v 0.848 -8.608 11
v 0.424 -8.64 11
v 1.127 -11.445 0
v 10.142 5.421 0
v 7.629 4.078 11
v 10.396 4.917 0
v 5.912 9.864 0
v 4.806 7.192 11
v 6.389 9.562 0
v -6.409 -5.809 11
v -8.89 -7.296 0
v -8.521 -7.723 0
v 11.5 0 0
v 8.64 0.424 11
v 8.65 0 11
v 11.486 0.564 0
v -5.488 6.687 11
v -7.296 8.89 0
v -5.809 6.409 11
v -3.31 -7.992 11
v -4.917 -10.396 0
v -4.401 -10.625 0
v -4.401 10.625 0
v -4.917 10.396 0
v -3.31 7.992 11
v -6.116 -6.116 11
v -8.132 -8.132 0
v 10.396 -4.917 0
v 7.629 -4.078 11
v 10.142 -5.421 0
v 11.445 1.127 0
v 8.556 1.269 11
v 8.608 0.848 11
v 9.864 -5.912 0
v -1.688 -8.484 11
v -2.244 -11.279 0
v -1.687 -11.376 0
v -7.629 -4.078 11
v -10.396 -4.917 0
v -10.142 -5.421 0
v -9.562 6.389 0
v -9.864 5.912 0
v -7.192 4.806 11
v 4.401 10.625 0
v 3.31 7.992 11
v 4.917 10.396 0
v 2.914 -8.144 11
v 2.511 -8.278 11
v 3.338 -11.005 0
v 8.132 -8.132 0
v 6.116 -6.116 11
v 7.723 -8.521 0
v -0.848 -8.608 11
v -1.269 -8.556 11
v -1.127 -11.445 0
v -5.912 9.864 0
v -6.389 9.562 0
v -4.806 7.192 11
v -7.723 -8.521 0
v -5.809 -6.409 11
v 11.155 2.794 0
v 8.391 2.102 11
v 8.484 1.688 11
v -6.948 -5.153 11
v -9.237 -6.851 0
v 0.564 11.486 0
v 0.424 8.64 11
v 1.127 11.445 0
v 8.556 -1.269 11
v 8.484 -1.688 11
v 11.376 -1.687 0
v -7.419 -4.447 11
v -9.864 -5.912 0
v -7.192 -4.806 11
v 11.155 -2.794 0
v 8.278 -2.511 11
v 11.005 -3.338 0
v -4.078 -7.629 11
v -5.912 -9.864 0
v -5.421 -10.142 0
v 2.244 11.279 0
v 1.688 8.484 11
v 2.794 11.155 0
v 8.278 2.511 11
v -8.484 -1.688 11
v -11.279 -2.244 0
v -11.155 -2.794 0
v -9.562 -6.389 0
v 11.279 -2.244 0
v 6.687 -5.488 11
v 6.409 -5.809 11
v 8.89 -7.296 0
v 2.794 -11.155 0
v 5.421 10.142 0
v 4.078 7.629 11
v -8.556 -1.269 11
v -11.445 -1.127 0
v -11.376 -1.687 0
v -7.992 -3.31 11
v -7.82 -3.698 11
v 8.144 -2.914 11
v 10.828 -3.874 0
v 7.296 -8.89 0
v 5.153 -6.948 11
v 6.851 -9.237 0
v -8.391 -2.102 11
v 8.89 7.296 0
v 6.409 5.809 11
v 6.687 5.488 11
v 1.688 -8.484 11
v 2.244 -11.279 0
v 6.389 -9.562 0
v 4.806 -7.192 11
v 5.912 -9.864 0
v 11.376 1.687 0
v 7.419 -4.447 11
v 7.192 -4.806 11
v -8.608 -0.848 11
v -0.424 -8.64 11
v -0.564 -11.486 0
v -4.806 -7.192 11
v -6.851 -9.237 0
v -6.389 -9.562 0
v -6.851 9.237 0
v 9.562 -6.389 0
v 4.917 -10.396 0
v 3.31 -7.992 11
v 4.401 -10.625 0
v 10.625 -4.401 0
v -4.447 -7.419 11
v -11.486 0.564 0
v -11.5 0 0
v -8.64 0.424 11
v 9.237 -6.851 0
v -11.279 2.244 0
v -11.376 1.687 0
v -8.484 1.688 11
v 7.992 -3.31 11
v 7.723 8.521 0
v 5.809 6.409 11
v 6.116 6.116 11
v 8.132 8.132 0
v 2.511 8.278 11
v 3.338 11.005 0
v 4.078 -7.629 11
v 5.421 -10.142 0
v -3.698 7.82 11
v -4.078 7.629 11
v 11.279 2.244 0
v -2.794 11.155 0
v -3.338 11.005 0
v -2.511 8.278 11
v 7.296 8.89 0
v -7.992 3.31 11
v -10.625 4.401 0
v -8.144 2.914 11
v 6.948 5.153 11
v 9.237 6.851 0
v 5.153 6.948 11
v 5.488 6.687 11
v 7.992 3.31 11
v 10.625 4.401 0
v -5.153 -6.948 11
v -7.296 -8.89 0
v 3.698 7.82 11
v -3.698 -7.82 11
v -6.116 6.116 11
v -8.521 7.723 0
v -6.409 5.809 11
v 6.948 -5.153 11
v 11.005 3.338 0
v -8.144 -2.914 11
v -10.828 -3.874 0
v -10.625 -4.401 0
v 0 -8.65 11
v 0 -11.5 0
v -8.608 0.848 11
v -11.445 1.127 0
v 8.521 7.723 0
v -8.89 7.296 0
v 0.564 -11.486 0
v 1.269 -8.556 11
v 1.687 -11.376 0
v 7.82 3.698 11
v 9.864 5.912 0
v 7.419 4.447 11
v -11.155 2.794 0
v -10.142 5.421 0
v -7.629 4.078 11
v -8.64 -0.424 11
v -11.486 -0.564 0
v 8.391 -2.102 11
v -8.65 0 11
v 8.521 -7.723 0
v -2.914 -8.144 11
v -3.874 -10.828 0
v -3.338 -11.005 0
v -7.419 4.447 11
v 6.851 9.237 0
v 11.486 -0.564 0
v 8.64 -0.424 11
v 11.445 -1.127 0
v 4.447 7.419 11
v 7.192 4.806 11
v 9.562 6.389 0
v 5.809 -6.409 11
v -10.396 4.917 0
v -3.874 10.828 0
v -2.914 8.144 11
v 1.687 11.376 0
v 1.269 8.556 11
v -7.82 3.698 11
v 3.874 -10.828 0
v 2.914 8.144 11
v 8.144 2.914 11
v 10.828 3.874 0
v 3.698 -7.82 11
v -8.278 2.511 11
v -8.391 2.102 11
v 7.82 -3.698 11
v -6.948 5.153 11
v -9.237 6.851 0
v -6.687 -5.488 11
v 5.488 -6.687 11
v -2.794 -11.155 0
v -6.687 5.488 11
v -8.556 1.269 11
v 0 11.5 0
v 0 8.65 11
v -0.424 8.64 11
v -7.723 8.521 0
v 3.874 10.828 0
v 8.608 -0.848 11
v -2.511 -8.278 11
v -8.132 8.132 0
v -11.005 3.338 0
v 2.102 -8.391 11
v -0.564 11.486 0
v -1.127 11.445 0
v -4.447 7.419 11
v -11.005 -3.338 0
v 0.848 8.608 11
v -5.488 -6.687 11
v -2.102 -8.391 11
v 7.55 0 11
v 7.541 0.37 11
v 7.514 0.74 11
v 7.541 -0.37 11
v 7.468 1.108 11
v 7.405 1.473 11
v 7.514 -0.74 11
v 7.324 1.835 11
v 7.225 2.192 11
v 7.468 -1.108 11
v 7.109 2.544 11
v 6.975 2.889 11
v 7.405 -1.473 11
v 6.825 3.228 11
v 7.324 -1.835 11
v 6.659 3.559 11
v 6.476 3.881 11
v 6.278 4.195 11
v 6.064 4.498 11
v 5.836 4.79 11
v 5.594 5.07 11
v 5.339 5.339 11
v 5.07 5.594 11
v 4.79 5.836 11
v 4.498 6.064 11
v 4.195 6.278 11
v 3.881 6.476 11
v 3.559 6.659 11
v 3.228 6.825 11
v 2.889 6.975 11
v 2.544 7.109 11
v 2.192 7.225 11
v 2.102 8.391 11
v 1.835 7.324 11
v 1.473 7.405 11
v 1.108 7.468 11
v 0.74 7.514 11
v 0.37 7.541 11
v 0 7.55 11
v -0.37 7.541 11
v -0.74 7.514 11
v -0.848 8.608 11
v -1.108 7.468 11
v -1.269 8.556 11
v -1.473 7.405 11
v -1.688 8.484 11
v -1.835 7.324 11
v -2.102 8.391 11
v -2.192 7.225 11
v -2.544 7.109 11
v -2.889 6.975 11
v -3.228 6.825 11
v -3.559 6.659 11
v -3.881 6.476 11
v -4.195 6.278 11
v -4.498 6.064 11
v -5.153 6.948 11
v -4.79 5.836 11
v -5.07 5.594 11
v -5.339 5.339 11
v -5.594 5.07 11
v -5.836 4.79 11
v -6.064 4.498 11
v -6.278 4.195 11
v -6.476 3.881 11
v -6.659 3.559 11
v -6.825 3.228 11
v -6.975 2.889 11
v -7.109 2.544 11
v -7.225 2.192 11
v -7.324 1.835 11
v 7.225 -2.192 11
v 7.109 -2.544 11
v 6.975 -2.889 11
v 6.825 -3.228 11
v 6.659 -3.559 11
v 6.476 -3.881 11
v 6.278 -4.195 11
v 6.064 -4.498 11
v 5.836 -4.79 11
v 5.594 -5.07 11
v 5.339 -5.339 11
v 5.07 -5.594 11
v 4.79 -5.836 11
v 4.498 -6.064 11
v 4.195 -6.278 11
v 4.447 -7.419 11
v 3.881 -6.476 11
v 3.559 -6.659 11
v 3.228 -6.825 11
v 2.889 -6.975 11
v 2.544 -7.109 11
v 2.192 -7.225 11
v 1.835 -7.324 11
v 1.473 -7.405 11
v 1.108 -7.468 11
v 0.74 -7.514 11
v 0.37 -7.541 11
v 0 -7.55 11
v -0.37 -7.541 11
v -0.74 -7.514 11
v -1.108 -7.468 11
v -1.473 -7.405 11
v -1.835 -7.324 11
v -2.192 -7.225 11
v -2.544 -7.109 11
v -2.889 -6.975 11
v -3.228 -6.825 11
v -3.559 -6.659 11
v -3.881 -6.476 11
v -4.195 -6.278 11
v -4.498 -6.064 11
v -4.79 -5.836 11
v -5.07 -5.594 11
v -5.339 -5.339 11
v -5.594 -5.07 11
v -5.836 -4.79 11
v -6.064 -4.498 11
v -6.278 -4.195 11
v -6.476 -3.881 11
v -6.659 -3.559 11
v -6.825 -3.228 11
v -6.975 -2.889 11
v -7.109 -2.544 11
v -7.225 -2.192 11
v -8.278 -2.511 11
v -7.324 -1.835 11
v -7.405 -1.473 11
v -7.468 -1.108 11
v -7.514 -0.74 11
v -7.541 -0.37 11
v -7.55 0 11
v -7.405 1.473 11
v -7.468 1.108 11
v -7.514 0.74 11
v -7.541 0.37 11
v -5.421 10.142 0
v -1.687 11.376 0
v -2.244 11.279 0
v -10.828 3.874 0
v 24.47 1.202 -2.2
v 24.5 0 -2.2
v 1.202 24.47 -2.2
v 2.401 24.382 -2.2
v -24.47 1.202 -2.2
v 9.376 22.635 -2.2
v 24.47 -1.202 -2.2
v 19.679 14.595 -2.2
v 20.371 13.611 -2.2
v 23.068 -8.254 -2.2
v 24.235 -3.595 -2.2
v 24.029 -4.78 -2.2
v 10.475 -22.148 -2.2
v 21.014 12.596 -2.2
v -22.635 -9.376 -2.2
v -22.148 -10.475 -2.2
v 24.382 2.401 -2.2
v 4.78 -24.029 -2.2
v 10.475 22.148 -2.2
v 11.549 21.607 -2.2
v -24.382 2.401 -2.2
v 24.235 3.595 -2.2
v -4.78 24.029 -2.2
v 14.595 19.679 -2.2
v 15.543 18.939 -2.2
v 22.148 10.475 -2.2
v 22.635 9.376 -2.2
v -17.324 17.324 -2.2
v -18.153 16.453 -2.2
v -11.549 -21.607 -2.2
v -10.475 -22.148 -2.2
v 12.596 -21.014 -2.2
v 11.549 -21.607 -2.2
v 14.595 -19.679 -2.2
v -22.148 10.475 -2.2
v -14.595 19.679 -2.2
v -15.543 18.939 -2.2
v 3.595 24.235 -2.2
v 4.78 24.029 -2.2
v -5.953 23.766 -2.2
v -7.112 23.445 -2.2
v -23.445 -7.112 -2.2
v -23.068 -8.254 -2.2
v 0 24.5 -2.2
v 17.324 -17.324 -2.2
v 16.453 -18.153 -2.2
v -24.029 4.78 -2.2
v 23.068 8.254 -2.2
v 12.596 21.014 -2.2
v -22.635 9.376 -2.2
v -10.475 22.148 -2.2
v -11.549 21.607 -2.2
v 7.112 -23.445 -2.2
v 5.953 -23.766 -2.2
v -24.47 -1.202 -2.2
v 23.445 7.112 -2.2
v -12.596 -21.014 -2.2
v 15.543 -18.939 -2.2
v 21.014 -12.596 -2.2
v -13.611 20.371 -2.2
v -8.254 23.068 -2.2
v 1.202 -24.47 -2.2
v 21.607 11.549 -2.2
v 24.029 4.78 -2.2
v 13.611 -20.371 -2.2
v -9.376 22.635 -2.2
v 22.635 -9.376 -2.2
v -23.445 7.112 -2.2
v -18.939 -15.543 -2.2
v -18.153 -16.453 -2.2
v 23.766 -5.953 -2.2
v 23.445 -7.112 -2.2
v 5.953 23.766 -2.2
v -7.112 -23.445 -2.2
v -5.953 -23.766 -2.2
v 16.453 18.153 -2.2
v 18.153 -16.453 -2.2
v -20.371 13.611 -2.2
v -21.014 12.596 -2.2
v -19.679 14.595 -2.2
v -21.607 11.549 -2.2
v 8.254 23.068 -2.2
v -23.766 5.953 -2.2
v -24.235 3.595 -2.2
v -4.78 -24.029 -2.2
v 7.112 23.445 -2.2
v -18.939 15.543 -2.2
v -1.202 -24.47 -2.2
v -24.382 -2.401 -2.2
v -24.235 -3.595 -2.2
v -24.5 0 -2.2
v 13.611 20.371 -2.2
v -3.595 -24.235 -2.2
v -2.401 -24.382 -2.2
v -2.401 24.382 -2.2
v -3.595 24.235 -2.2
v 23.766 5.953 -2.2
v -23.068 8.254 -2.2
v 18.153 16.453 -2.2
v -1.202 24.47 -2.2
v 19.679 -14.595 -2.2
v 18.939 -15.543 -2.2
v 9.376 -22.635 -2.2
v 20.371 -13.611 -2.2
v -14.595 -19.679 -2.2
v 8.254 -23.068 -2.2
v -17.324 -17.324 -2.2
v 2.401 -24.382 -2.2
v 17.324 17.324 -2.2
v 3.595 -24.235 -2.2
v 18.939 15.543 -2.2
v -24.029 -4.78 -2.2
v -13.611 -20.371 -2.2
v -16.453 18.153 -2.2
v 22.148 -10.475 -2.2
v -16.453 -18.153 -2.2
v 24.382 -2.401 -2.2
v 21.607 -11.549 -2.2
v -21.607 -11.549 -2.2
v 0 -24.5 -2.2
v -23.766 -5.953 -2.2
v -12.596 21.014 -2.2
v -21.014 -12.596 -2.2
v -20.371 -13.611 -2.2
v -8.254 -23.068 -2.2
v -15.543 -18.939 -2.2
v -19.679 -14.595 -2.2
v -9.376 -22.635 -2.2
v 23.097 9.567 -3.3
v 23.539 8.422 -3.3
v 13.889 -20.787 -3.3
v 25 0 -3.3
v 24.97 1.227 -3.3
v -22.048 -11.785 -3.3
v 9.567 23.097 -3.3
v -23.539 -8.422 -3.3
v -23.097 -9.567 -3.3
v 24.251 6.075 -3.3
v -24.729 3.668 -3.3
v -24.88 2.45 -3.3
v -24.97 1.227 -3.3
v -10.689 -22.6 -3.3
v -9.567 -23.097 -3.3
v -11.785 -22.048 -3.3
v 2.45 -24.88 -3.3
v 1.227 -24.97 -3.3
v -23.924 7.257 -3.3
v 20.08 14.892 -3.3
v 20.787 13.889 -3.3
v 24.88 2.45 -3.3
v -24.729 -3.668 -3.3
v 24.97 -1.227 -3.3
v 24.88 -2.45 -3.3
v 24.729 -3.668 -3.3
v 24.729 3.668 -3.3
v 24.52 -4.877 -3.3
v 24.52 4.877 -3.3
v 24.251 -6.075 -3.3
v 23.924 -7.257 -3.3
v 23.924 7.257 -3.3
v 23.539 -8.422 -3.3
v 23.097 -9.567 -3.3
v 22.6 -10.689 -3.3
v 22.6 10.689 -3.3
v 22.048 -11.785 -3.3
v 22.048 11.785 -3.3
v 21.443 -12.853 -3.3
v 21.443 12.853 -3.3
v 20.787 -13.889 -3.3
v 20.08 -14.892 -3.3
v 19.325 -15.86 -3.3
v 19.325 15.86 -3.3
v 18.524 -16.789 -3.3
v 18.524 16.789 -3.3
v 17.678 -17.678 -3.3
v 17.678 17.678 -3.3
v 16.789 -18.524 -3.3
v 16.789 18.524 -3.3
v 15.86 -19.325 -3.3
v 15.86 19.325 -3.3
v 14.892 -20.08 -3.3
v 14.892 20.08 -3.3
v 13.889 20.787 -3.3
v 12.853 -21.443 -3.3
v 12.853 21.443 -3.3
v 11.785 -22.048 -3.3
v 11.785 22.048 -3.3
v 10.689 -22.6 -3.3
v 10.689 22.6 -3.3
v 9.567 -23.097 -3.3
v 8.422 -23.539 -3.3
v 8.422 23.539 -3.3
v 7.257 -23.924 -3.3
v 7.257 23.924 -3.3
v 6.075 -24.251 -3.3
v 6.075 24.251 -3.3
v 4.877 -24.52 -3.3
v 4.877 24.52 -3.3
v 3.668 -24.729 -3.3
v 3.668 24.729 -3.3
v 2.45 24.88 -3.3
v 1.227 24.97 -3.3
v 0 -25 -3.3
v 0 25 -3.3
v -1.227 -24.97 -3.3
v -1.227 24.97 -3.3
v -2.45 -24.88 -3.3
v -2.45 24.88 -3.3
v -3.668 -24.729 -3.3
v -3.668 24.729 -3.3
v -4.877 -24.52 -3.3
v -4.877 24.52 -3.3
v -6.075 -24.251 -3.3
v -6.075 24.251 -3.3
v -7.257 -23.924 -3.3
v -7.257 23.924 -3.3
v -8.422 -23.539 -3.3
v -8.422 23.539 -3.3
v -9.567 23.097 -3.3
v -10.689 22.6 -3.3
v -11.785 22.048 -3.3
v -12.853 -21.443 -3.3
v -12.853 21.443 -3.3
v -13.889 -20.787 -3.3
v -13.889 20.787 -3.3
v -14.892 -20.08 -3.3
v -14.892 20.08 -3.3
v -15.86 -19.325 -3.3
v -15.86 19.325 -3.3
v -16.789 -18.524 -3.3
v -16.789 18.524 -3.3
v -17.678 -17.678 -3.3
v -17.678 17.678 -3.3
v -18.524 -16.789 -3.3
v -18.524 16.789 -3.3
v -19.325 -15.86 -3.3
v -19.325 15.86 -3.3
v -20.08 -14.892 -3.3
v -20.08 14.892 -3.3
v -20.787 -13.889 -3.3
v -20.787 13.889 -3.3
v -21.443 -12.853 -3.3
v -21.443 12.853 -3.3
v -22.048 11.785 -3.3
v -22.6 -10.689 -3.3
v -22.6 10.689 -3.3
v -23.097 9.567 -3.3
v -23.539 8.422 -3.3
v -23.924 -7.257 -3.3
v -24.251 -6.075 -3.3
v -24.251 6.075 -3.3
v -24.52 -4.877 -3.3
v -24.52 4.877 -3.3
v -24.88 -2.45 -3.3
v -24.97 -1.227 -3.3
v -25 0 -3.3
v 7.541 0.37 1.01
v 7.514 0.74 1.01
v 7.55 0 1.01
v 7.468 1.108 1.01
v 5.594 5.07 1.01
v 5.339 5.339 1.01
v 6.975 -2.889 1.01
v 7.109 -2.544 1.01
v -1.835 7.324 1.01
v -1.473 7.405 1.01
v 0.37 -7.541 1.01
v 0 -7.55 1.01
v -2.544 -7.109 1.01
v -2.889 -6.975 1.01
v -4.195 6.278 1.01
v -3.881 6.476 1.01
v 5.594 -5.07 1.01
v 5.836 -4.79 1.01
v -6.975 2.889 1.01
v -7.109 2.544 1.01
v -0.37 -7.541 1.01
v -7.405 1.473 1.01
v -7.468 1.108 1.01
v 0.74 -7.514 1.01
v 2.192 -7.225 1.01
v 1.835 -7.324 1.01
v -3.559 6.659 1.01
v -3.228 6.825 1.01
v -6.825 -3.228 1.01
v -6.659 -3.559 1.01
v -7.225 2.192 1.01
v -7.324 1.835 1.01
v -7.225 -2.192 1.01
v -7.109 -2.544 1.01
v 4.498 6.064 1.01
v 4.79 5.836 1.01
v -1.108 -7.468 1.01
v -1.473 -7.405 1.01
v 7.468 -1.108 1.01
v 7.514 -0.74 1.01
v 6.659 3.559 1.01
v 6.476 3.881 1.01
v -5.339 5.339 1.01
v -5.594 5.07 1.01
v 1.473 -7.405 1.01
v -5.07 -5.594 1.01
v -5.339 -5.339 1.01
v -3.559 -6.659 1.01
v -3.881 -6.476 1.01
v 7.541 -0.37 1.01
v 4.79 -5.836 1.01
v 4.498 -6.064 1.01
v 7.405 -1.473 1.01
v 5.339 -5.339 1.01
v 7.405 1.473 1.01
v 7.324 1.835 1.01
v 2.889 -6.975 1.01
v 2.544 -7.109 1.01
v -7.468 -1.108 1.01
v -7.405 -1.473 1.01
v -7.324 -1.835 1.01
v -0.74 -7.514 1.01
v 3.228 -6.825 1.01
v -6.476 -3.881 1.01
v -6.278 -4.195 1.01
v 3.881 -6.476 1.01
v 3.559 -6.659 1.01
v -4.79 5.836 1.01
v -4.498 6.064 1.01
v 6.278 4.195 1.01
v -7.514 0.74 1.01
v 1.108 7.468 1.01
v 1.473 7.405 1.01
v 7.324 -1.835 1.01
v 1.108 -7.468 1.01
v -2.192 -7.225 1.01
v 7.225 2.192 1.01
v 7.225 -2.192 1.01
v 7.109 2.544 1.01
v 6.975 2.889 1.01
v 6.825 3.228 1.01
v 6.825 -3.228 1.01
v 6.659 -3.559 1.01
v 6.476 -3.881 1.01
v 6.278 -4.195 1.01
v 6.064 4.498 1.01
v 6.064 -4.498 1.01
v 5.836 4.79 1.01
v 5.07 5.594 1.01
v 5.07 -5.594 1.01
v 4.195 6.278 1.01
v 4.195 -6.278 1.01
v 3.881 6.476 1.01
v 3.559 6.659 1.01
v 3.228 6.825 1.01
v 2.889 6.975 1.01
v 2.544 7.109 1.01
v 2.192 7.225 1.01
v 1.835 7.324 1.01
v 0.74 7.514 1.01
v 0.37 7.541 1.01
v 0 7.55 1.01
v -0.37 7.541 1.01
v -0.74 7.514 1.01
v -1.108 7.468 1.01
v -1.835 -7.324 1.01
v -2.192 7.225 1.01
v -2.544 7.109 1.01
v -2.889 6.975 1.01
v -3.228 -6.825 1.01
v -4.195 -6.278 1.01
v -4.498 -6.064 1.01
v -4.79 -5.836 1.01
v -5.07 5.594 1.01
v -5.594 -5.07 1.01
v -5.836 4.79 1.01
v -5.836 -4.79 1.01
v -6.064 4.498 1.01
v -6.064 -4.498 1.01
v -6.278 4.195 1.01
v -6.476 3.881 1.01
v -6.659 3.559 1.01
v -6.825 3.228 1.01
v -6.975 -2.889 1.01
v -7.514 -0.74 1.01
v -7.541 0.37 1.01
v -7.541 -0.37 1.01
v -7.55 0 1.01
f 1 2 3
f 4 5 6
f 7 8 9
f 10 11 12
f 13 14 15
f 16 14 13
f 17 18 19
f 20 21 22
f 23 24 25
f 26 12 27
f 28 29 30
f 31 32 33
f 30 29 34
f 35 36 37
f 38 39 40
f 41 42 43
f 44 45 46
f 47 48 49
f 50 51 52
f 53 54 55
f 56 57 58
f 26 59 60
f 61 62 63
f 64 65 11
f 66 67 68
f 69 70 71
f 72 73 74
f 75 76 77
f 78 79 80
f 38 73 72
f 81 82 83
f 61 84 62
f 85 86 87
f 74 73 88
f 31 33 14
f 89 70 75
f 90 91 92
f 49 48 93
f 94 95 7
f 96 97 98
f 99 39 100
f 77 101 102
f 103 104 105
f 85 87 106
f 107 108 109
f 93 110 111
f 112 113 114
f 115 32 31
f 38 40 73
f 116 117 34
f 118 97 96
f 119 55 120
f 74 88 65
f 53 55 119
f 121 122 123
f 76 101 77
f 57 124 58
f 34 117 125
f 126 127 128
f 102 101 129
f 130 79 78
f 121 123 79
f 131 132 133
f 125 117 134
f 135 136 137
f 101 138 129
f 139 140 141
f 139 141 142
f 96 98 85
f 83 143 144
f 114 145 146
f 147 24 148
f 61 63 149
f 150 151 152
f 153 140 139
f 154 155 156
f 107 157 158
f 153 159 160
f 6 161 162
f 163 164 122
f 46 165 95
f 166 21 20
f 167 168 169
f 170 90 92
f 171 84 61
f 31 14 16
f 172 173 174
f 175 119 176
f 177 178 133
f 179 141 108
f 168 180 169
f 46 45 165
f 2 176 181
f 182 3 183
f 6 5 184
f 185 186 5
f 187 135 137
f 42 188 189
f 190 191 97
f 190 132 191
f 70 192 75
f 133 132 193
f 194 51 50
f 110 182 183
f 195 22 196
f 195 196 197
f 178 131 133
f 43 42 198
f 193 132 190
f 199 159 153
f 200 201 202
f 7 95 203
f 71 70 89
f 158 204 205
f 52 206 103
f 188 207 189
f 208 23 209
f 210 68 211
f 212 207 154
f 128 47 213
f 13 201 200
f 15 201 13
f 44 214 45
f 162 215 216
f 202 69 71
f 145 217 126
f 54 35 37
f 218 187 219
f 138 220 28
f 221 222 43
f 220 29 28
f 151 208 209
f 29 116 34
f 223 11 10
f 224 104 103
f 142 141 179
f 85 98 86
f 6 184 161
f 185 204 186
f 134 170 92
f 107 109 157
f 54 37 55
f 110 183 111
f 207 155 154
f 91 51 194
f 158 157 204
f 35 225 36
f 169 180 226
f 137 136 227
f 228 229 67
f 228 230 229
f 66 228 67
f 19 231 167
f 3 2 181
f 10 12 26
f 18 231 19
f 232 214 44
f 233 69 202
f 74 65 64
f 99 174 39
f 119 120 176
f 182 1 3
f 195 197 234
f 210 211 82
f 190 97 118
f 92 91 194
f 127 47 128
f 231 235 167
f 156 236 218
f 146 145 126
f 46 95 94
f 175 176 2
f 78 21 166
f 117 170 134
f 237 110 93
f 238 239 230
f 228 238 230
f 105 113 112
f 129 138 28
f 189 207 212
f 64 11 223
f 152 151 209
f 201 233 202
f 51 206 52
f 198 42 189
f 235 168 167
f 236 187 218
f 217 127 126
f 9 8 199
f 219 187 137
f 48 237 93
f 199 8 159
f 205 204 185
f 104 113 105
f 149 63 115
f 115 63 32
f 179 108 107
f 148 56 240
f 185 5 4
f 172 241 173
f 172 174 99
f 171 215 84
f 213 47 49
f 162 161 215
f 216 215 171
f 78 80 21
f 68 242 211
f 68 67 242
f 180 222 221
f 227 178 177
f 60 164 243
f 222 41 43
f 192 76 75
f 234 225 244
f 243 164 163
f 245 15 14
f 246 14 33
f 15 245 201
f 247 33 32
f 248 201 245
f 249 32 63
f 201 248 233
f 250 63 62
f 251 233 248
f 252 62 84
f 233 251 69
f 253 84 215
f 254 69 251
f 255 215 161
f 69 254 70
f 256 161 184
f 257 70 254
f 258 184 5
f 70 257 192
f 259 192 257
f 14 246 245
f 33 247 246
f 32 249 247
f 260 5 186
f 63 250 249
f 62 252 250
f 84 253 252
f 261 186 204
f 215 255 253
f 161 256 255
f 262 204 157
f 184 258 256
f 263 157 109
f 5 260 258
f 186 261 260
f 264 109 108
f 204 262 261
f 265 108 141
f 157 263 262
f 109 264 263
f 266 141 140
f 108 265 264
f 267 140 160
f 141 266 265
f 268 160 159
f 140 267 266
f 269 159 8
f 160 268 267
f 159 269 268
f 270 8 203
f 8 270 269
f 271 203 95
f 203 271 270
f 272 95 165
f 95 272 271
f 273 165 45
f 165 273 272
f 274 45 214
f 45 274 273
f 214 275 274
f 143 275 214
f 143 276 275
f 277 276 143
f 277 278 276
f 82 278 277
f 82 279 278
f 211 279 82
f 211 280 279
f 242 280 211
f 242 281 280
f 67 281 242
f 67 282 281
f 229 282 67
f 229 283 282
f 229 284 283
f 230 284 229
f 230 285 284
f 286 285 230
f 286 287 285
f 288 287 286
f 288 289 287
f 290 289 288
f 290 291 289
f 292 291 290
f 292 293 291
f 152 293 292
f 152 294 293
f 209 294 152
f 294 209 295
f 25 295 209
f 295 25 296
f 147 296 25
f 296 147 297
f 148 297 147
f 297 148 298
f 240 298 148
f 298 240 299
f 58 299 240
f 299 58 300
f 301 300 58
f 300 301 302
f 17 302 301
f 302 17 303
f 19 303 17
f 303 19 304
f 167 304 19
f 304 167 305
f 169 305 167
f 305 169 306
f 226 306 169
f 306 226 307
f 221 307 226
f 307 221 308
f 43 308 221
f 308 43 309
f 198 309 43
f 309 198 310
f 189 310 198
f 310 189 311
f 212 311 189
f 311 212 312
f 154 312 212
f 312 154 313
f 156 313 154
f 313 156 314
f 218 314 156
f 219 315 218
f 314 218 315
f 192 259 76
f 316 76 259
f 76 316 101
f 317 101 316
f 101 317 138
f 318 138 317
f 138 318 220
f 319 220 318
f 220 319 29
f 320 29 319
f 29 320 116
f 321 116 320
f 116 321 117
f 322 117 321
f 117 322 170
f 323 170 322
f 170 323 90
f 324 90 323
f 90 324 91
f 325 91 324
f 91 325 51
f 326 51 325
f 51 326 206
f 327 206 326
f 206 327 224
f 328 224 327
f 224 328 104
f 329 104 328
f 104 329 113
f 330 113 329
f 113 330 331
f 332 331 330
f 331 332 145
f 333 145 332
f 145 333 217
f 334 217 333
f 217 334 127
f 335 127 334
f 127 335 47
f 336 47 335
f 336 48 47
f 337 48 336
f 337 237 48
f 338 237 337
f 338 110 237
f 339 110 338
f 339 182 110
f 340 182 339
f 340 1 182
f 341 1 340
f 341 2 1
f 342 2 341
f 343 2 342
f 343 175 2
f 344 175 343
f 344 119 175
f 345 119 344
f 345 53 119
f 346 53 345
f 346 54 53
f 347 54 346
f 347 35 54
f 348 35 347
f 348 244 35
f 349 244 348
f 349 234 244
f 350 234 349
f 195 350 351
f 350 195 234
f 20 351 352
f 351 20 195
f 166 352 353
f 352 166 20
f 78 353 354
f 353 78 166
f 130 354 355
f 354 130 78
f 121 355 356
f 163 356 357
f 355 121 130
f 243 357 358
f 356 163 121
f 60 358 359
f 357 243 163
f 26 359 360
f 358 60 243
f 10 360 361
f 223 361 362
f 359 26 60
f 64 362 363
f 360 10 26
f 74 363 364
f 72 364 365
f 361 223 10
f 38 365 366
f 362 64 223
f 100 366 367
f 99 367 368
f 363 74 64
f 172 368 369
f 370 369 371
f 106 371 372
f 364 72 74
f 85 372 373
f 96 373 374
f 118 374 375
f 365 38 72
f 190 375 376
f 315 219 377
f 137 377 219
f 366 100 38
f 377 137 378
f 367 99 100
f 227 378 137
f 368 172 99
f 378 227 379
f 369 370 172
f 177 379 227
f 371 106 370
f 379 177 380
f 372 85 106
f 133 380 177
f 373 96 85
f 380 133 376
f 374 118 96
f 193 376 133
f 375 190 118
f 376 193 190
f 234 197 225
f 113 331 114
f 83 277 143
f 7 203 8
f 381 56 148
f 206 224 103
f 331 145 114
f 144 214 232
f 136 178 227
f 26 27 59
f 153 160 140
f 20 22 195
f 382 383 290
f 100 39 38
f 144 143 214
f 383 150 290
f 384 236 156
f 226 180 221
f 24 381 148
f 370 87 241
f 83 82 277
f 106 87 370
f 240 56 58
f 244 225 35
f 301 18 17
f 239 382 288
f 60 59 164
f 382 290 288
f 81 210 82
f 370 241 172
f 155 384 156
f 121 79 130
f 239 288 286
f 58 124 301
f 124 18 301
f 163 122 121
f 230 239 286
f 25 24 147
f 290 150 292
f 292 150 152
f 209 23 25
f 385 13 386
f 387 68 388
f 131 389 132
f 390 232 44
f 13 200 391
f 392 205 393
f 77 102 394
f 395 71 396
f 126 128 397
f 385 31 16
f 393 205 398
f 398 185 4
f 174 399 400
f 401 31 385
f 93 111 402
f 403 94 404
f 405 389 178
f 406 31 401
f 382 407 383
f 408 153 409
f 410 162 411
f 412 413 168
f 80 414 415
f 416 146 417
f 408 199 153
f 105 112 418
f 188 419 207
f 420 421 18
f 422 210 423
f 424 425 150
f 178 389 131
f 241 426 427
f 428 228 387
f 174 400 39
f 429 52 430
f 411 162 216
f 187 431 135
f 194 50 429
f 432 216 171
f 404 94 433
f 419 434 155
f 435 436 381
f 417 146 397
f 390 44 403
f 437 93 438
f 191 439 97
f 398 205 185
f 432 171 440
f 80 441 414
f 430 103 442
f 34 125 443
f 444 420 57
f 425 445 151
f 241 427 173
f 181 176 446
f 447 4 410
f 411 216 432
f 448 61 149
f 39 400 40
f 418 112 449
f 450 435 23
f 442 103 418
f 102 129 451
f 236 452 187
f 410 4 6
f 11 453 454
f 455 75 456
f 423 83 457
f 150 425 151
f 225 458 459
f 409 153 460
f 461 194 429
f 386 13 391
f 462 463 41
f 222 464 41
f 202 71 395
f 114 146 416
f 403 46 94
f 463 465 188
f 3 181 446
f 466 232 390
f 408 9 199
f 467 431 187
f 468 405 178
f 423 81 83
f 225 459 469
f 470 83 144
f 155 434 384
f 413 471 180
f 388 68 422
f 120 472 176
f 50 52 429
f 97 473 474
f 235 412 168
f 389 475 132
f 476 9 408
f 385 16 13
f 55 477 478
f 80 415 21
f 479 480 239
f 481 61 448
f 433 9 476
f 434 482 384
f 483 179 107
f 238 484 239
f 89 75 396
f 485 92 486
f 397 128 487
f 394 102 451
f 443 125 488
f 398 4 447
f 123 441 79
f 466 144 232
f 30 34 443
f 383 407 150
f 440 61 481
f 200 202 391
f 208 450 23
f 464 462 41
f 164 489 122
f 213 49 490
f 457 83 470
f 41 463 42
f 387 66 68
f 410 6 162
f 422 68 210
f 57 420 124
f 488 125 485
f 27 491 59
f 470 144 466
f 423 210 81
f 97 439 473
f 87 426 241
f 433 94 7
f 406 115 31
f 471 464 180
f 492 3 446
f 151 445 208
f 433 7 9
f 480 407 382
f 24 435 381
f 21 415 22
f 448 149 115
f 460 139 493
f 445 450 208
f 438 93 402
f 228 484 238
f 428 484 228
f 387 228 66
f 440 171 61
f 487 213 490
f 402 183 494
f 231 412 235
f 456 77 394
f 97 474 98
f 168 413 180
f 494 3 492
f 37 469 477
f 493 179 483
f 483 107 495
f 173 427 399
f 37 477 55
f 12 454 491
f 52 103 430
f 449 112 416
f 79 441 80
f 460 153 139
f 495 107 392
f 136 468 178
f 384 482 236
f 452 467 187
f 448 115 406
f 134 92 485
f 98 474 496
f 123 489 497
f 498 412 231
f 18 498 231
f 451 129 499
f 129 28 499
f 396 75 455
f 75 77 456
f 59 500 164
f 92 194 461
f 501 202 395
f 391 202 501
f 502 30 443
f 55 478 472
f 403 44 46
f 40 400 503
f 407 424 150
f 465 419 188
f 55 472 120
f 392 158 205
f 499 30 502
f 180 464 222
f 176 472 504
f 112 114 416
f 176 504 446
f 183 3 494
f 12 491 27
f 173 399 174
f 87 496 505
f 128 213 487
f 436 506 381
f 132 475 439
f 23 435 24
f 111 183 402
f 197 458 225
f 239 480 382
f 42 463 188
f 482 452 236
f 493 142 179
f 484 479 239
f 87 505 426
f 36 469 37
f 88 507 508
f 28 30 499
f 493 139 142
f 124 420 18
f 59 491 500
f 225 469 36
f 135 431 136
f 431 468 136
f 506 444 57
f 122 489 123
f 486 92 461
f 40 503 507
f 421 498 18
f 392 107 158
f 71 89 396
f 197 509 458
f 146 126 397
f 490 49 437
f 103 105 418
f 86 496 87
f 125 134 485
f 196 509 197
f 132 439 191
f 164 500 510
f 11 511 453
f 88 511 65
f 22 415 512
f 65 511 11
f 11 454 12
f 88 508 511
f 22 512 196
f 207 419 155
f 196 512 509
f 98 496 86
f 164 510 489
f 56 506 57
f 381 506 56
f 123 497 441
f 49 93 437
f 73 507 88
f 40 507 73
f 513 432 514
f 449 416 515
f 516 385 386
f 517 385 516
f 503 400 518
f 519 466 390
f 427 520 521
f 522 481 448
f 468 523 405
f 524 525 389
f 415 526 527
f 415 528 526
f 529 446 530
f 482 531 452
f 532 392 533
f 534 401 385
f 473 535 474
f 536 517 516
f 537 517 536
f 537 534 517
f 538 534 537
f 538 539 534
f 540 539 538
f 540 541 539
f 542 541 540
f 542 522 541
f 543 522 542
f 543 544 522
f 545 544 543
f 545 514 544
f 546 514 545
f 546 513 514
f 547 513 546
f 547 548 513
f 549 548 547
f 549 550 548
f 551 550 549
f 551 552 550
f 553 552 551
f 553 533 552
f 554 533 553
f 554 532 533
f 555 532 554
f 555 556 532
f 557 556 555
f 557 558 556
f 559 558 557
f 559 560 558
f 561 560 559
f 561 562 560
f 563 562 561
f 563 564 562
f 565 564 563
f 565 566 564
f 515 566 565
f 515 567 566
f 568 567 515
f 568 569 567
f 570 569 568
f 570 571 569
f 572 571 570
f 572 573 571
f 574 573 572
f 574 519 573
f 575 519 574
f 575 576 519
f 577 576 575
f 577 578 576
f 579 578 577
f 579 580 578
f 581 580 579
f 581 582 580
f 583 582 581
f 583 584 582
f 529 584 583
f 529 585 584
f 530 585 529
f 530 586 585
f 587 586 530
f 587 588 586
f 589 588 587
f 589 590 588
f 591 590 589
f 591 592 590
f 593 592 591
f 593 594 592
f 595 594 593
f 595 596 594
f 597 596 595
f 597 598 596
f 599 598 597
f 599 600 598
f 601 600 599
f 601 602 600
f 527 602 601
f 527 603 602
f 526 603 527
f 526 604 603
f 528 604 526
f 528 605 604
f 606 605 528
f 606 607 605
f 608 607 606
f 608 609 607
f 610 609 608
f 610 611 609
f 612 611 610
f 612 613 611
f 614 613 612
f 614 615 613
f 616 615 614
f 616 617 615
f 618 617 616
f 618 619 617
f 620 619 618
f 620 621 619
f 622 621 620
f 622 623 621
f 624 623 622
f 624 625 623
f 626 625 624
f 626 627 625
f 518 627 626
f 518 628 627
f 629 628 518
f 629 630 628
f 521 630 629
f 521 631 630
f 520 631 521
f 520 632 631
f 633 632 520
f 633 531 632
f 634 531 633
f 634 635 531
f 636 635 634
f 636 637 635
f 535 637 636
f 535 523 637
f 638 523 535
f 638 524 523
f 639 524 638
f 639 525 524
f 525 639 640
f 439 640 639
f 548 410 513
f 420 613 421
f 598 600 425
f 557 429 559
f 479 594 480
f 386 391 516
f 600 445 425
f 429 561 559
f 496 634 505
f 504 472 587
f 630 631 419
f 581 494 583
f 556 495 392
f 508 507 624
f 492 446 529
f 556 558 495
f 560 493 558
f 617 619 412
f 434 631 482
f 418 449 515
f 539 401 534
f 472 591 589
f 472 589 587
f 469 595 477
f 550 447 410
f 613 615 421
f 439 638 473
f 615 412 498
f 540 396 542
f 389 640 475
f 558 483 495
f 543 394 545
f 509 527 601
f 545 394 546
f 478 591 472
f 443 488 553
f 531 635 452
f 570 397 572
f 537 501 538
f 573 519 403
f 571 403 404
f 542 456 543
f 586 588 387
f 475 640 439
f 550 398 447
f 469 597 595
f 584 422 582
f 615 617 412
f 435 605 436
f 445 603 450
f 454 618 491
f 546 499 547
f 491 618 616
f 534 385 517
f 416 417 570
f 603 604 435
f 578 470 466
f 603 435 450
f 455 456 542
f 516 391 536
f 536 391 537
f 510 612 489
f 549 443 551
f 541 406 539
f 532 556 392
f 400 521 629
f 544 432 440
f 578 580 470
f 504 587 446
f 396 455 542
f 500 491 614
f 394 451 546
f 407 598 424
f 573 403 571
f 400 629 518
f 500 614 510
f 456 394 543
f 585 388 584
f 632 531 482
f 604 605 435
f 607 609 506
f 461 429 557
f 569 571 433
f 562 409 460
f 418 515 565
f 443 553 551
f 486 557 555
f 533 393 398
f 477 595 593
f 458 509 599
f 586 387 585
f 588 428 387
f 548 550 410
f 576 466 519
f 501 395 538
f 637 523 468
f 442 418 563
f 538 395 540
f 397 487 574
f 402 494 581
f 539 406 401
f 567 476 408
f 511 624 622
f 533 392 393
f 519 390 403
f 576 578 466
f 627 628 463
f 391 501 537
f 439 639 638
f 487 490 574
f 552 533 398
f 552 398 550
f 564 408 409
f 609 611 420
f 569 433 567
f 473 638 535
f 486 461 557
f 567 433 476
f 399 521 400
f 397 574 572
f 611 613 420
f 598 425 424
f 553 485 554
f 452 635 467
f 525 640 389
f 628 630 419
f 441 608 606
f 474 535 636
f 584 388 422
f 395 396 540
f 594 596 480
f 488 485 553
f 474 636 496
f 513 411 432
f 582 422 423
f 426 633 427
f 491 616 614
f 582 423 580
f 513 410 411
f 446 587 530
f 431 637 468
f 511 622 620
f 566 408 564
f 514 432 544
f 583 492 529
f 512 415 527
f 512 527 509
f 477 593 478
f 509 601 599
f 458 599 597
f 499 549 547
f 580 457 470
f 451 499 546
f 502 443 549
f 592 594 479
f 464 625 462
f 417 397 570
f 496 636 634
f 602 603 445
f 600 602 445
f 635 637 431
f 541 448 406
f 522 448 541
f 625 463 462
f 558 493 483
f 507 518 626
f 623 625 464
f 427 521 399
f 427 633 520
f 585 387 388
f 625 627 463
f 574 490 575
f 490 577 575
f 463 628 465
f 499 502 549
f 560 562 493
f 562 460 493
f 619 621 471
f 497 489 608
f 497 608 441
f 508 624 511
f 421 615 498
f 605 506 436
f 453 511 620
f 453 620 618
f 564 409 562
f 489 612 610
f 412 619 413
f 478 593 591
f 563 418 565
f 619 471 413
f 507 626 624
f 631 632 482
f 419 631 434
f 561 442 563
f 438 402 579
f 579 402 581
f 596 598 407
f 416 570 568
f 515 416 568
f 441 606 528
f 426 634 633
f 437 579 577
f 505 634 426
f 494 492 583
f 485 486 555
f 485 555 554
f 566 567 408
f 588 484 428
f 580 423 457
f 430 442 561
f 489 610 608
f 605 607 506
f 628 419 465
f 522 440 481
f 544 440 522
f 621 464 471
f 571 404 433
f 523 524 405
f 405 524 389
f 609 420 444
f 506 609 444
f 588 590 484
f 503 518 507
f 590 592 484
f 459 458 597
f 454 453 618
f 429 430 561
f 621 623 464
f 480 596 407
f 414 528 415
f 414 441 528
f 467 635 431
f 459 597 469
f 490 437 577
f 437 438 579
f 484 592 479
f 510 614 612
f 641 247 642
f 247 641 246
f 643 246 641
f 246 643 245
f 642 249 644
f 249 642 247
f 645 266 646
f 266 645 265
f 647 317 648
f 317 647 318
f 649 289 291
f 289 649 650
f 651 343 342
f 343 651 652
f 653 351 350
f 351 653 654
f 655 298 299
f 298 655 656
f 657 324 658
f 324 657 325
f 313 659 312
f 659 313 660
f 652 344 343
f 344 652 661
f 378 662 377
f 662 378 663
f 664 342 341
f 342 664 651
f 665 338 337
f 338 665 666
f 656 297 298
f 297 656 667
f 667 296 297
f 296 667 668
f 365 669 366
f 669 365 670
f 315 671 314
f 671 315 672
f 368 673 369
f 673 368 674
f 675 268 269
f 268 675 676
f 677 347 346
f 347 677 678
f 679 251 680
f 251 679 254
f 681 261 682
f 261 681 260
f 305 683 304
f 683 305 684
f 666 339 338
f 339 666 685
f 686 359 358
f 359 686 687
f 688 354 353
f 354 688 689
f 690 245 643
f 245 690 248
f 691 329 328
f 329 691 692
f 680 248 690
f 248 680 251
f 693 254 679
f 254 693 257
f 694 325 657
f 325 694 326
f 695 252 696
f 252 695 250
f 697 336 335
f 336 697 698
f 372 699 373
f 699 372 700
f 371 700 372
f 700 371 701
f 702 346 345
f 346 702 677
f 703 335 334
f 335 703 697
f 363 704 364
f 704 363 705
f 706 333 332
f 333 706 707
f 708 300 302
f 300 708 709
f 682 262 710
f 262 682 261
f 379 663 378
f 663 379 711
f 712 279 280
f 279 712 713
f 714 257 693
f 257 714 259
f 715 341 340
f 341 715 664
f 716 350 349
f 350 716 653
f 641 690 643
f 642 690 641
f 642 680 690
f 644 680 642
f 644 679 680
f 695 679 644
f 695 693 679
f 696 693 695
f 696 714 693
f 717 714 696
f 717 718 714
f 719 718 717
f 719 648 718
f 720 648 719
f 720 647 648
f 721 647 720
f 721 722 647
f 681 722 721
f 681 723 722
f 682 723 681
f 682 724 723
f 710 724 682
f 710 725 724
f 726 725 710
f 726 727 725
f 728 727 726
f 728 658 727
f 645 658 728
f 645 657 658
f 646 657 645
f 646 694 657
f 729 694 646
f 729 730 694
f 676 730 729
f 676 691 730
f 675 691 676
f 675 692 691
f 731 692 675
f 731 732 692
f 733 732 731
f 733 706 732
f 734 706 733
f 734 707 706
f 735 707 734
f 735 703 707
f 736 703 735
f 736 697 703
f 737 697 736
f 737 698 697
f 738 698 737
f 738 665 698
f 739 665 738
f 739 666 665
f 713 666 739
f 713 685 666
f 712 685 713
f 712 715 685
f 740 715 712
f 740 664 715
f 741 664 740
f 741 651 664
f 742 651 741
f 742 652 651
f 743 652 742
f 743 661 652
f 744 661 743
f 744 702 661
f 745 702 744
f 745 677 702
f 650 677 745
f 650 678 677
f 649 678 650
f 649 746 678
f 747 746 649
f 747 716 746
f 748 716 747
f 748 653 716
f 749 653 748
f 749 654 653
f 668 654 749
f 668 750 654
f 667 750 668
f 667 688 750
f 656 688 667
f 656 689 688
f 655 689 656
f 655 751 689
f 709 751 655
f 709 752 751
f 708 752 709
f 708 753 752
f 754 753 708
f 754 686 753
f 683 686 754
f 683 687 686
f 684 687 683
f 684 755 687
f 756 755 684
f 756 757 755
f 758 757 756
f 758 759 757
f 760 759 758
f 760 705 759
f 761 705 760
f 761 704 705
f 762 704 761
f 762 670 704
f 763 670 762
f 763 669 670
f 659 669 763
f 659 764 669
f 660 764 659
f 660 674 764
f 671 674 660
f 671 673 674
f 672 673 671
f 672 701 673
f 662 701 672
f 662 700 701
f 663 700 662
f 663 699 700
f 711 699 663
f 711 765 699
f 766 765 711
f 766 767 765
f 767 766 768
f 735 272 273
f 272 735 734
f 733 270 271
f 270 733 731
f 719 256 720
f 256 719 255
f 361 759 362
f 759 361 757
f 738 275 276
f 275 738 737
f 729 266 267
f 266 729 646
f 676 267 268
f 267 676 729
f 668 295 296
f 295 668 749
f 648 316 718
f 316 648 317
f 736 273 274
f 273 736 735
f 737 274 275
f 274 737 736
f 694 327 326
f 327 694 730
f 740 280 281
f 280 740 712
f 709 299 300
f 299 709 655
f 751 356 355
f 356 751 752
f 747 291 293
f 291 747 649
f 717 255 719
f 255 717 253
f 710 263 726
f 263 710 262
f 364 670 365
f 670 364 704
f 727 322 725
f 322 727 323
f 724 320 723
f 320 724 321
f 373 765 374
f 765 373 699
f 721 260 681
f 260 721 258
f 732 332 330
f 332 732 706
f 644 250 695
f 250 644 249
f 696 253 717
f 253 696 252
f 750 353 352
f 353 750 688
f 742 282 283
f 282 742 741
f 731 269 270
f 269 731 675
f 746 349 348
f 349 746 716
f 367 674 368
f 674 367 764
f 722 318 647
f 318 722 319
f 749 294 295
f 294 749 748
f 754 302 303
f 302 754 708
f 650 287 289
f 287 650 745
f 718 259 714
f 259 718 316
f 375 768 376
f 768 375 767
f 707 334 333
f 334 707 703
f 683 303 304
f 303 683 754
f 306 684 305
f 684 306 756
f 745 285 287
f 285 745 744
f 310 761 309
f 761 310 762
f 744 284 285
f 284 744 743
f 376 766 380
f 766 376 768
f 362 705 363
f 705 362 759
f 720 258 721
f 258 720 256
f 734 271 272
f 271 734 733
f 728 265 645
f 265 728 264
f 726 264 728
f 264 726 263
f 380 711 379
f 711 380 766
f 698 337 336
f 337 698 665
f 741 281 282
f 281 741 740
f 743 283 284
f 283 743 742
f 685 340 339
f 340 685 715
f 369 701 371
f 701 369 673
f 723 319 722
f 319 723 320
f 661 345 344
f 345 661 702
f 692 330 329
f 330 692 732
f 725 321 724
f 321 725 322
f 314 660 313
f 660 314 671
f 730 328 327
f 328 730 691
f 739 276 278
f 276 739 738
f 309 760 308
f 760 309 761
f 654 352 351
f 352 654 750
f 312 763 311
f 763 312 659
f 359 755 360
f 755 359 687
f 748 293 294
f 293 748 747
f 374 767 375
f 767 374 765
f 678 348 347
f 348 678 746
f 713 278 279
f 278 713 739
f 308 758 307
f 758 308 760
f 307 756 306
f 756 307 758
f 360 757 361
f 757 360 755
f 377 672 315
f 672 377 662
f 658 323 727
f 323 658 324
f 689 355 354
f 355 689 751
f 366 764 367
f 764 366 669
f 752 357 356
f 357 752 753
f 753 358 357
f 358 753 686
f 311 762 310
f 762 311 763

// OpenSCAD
// dc-flask-base
// Configurable flared base for flasks, test tubes or other cylindrical objects
// Copyright 2014-2016 Nicholas Brookins and Danger Creations, LLC
// http://dangercreations.com/
// https://github.com/nbrookins/danger-gadgets.git
// http://www.thingiverse.com/knick

fnv=128;

//diameter of the hole, should be about the same as the vessel you'd like to hold
inside_diameter = 15.1;
//depth of the hole
inside_depth = 10;
//thickness of the material under the vessel.  This can be 0 to make it go through, or as high as you'd like to lift the vessel
bottom_thickness = 1;
//width of the extra supporting flare.  should be greater than the inside_diameter, but smaller than outside_diameter.
flare_diameter = 23;
//the width of the overall base
outside_diameter = 49;
//thickness of the outside edge
outside_thickness = 1.1;

union(){
	difference(){
		union(){
			cylinder(d1=flare_diameter, d2=inside_diameter + outside_thickness*2, h= inside_depth + bottom_thickness, $fn=fnv);
			translate([0,0,-outside_thickness*2])
			cylinder(d1=outside_diameter, d2=flare_diameter, h=outside_thickness*2, $fn=fnv);
			translate([0,0,-outside_thickness*3])
			cylinder(d1=outside_diameter+1, d2=outside_diameter, h=outside_thickness, $fn=fnv);
			
		}
		translate([0,0,bottom_thickness +.01])
		cylinder(d=inside_diameter, h=inside_depth, $fn=fnv);
	}
}
